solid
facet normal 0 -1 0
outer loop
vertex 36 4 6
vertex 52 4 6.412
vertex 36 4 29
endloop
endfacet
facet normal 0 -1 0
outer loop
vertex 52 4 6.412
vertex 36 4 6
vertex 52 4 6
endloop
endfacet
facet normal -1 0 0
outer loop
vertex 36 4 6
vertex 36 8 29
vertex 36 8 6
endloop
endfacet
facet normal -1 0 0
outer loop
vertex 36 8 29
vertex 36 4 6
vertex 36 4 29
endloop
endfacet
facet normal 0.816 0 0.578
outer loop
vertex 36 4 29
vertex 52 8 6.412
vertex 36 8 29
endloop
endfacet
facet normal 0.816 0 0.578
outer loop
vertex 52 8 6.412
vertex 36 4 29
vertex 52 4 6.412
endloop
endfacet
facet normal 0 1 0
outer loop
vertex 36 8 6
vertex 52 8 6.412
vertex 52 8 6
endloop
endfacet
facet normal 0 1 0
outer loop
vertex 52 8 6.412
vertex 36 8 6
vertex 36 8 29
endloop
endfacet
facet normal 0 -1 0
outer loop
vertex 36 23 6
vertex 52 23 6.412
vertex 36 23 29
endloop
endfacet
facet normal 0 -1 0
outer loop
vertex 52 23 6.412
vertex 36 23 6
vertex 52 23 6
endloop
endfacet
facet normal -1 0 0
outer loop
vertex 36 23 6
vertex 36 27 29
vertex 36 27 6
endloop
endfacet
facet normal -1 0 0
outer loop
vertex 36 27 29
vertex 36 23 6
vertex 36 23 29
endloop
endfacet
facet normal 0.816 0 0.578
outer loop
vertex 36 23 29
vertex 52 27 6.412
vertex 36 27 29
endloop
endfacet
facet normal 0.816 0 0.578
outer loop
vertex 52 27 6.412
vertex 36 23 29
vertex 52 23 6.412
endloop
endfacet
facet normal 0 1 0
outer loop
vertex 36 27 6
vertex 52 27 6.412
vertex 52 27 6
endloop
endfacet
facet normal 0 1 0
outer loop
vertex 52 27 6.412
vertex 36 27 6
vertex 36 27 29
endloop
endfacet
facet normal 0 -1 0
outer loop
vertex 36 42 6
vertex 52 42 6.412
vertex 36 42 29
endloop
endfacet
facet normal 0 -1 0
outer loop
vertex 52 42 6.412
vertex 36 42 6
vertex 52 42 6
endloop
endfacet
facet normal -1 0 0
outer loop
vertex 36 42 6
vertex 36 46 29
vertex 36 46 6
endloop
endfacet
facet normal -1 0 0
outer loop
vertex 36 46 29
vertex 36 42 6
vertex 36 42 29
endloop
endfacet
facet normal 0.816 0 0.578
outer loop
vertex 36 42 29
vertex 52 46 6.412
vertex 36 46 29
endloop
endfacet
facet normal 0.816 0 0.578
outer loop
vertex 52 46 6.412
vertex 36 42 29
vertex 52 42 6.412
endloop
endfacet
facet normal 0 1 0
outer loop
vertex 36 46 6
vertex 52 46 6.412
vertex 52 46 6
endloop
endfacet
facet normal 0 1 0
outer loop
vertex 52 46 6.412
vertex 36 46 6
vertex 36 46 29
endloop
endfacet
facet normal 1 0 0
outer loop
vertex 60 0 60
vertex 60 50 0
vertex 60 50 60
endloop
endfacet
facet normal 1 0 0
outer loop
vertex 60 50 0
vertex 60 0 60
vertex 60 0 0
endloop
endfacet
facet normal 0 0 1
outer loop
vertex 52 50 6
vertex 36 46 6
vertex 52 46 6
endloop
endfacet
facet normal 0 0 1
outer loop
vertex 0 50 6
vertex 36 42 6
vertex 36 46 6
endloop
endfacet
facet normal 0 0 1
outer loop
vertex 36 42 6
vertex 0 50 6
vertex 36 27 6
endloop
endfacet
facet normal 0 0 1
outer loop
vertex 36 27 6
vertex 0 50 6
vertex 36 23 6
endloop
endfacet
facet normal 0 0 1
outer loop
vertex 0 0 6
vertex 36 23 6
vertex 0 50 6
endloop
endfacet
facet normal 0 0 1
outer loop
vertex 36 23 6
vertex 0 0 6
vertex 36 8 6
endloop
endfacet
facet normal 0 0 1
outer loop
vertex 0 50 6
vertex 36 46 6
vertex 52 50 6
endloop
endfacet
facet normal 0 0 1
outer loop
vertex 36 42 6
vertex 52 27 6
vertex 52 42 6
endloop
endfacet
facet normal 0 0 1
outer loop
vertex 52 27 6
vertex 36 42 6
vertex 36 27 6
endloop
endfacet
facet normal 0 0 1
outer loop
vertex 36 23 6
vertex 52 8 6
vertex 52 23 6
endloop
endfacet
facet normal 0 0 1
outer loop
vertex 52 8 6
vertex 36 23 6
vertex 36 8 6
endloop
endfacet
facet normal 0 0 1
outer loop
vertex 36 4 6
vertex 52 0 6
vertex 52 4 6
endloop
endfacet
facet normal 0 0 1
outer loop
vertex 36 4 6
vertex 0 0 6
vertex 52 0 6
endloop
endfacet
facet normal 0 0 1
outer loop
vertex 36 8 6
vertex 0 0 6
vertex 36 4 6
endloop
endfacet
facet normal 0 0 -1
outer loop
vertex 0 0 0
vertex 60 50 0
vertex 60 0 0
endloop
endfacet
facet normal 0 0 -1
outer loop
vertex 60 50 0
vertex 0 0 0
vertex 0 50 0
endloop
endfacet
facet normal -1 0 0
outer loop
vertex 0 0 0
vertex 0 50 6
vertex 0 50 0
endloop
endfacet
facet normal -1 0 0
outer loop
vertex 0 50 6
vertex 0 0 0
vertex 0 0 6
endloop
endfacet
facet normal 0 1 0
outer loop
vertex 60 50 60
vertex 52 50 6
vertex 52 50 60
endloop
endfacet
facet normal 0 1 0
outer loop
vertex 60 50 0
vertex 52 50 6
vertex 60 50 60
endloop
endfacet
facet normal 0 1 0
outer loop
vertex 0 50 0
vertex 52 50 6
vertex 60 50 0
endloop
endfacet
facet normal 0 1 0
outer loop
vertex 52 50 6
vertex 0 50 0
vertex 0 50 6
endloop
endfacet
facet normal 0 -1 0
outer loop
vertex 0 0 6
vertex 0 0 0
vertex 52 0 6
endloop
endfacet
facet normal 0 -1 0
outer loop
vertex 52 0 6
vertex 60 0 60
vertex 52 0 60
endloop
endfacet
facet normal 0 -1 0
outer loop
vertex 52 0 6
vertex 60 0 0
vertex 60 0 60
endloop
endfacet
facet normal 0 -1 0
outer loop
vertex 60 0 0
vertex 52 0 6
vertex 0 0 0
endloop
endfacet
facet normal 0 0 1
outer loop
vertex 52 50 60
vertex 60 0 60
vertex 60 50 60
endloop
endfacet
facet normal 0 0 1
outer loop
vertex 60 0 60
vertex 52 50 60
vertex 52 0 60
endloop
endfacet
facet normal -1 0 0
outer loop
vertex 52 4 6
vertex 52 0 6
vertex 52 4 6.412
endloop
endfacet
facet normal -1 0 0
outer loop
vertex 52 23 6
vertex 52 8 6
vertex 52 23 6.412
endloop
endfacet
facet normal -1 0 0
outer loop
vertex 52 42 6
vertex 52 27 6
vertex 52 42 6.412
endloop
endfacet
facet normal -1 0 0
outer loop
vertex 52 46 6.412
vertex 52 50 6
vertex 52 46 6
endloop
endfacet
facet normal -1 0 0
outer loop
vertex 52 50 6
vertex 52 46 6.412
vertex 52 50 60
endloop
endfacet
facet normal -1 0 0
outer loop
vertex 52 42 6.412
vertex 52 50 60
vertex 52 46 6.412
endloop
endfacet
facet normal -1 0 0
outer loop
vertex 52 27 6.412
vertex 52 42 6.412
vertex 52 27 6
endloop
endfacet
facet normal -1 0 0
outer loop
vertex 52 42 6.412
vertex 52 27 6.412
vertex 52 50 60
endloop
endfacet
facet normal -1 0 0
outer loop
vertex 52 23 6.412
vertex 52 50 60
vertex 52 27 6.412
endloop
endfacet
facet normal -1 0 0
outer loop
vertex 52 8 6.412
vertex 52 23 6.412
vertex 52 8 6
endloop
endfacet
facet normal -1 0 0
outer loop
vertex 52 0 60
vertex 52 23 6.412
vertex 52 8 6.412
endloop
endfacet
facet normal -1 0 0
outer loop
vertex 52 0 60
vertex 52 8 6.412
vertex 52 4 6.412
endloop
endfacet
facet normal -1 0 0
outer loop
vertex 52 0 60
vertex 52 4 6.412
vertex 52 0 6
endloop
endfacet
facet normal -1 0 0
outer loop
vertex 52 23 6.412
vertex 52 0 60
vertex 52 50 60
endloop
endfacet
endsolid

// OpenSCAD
$fn = 32;

// ----------------------------------------------------------------------
// Rib bracket: 3-gusset L bracket
// ----------------------------------------------------------------------

// --- parameters (mm) ---
base_l = 60;              // foot length, X
base_w = 50;              // foot width, Y
base_t = 6;               // foot thickness
plate_t = 8;              // upright plate thickness
plate_h = 60;             // overall height
gus_l = 16;               // gusset leg along the foot
gus_h = 24;               // gusset height
gus_t = 4;                // gusset thickness
gus_edge = 4;             // gusset margin from the foot edge
n_gus = 3;                // gusset count

gus_pitch = (base_w - 2 * gus_edge - gus_t) / (n_gus - 1);  // gusset pitch

union() {
  cube([base_l, base_w, base_t]);
  translate([base_l - plate_t, 0, base_t - 1])
    cube([plate_t, base_w, plate_h - base_t + 1]);
  for (i = [0 : n_gus - 1])
    translate([base_l - plate_t - gus_l, gus_edge + i * gus_pitch, base_t - 1])
      rotate([-90, 0, 0])
        linear_extrude(height = gus_t)
          polygon(points = [[0, 0], [gus_l + 1, 0], [0, -gus_h]]);
}
